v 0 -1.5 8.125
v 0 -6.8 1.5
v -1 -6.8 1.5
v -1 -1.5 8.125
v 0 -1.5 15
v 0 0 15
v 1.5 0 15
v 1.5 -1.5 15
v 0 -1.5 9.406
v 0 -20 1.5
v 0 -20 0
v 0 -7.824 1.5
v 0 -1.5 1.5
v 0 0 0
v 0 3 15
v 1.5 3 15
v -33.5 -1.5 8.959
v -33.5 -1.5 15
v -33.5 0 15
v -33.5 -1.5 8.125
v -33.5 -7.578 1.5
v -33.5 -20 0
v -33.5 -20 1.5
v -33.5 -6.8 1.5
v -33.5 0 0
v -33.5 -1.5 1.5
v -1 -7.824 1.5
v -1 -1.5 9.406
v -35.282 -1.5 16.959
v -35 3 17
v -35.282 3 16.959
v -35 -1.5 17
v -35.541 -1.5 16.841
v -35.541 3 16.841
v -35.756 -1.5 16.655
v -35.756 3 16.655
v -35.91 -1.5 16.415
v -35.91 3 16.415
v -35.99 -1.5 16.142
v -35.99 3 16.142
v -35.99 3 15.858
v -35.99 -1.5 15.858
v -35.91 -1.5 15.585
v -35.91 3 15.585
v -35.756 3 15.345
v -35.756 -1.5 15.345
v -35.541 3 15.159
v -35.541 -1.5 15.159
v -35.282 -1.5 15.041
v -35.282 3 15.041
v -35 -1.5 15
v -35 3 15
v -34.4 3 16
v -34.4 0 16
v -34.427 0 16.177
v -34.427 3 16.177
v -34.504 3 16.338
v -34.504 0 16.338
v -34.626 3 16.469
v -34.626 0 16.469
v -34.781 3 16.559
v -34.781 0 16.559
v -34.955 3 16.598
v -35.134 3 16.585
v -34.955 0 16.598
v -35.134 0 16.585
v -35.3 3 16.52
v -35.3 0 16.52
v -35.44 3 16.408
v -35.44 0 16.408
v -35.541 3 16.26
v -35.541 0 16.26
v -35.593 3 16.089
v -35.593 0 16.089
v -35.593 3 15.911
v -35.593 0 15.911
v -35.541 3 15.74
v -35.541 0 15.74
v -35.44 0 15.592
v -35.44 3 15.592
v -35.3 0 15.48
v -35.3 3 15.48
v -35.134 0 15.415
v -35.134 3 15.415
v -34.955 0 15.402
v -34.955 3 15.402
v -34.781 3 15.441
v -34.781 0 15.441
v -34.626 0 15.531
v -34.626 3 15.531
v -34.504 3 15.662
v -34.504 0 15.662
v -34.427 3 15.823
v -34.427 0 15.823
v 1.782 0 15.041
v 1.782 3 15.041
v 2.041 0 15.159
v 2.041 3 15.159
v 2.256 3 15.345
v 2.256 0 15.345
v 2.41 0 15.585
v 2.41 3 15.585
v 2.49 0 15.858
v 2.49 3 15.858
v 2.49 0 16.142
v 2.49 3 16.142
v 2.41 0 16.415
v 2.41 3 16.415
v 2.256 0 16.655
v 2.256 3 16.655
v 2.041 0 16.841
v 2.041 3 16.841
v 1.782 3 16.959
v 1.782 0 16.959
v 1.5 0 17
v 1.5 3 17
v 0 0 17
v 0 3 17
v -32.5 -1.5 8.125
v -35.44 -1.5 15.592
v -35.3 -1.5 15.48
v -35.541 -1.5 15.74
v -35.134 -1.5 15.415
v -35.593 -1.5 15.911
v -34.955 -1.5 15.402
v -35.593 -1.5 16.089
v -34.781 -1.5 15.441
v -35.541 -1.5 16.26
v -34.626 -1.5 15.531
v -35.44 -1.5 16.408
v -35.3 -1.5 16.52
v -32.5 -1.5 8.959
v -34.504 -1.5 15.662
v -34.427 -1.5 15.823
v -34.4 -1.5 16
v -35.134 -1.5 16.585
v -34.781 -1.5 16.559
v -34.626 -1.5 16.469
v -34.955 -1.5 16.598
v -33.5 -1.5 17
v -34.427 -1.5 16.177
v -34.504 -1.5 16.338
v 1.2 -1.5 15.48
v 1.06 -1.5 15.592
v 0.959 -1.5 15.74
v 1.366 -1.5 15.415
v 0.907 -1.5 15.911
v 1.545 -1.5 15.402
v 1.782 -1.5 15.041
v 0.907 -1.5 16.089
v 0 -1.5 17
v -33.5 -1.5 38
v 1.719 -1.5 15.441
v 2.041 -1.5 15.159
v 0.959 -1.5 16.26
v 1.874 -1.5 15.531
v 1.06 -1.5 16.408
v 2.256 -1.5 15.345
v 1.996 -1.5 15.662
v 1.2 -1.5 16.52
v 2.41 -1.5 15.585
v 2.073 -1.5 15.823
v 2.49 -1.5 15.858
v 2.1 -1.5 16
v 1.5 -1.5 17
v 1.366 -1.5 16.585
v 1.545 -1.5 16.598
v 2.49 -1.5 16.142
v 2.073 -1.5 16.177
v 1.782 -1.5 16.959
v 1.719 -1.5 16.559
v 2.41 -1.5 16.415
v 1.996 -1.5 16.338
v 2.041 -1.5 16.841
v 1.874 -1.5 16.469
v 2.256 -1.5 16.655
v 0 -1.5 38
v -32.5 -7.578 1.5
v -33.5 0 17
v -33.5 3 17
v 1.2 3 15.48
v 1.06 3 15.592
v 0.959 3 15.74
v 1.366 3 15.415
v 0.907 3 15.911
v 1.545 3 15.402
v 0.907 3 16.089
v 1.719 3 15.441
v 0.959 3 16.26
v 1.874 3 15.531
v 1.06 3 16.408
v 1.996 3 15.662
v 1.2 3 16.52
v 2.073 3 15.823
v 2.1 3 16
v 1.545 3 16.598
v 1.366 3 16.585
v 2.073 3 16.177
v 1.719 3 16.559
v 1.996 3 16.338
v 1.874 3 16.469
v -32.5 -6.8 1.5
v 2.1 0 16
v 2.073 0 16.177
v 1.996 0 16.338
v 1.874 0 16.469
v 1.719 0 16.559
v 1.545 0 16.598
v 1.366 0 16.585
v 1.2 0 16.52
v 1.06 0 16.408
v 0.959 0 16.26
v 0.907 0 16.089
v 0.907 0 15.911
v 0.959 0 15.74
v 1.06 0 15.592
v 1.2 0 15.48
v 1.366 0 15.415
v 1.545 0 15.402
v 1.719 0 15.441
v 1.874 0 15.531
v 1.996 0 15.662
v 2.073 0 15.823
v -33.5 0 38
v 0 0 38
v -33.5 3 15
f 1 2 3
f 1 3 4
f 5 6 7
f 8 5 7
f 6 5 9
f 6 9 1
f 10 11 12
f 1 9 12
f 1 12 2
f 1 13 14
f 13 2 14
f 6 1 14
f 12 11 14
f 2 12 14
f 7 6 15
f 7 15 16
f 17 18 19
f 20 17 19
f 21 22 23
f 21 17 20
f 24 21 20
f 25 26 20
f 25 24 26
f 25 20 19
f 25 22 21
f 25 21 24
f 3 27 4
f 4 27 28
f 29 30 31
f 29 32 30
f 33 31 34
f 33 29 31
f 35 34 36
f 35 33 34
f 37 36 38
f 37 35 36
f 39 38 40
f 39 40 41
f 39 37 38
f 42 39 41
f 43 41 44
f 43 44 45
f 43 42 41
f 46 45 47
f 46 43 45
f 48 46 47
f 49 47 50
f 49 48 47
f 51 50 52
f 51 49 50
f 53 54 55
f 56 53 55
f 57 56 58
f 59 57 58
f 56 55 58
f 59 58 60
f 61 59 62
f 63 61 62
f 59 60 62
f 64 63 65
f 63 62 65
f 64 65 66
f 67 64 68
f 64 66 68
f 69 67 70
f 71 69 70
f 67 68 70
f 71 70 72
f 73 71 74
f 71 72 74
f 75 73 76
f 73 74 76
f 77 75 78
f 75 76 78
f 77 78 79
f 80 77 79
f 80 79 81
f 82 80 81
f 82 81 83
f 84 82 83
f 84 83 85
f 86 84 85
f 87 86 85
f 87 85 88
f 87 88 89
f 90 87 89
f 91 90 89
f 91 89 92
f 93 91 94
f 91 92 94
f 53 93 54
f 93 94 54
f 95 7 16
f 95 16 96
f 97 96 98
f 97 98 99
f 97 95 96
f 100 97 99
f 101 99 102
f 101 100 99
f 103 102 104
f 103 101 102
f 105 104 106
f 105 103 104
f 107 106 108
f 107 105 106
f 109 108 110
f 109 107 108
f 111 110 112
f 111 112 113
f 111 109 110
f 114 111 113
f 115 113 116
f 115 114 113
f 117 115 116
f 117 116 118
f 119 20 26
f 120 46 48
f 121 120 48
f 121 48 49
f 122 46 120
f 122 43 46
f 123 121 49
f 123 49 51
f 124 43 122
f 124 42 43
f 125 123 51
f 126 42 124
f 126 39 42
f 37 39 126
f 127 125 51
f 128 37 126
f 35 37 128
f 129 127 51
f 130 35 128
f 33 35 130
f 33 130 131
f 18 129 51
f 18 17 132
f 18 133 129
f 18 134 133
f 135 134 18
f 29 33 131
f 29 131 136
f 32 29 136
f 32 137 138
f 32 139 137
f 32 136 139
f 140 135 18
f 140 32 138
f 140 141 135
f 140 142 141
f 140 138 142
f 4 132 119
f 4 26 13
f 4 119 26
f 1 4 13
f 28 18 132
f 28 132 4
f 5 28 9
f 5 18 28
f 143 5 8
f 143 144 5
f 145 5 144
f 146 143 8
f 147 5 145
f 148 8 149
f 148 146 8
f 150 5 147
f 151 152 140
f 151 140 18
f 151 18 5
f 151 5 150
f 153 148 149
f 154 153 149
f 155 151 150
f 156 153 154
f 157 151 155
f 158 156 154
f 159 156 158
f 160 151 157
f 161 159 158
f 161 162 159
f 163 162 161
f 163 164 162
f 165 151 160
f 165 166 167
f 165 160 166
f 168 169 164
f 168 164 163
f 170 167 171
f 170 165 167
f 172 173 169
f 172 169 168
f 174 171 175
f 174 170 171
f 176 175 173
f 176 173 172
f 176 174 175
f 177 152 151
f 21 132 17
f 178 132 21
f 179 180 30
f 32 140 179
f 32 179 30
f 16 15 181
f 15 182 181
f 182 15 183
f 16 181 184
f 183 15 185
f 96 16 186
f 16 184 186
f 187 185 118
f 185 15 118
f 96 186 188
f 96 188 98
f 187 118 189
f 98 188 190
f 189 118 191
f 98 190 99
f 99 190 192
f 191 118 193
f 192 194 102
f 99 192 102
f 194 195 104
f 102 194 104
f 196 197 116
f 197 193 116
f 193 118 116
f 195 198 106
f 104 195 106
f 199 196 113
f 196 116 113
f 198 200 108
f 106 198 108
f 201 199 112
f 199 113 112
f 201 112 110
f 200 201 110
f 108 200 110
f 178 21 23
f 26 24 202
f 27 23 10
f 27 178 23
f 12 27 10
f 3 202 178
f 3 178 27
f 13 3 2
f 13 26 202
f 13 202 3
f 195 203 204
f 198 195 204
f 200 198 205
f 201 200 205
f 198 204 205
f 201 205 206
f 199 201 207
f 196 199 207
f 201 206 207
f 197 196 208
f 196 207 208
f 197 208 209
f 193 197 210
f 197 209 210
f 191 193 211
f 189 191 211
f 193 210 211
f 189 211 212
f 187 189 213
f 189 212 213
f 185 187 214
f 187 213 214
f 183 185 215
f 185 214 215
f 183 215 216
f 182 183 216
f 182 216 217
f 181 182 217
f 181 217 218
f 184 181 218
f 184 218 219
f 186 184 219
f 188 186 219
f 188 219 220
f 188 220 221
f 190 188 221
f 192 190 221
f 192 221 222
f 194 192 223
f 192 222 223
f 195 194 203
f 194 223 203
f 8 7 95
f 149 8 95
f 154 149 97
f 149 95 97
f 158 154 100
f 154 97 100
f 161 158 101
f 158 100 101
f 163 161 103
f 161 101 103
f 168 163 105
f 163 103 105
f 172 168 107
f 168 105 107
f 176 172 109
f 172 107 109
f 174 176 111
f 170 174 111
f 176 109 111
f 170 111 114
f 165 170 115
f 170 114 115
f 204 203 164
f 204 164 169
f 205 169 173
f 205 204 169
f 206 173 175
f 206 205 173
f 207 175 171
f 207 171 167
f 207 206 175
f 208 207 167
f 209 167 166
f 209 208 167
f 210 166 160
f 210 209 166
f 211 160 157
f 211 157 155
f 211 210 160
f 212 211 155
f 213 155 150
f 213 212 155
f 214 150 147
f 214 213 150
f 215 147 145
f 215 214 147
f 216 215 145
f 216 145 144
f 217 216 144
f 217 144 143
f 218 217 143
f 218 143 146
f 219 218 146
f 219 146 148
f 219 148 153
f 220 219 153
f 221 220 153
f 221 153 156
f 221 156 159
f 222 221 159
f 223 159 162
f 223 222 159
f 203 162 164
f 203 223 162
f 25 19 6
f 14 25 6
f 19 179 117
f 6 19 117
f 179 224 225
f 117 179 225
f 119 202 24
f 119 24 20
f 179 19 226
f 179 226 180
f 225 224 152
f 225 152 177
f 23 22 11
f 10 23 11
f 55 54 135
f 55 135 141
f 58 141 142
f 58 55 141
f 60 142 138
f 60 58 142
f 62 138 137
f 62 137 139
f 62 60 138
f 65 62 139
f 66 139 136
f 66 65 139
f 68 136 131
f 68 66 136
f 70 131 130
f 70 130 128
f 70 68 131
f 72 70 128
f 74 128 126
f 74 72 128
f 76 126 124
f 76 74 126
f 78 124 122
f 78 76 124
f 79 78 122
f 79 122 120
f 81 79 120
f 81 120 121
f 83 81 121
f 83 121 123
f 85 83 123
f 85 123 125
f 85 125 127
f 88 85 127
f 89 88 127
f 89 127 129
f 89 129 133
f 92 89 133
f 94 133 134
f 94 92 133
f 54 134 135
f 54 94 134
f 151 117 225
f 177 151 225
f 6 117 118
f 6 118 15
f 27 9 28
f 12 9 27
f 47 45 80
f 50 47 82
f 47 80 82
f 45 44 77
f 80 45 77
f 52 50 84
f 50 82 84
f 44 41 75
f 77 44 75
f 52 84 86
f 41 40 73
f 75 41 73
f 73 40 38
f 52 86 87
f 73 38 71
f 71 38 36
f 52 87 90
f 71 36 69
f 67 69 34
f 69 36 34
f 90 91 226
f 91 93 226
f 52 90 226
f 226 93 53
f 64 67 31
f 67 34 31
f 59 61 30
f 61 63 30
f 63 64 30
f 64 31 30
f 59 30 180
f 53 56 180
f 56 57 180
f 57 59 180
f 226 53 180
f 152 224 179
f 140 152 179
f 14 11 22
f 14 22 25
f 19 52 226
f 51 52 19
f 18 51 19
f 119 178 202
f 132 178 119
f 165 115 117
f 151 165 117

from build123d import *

# Parameters (mm, degrees)
F0_W     = 33.5
F0_H     = 21
F0_H_2   = 2
F0_H_3   = 15
F0_R     = 0.6
F3_DEPTH = 1.5
F1_W     = 33.5
F1_H     = 20
F4_DEPTH = 1.5
F5_DEPTH = 1
F8_DEPTH = 1
F9_DEPTH = 3


with BuildPart() as f3:
    # F0 (on Front) → F3 (new body)
    with BuildSketch(Plane.XZ):
        with Locations((-16.75, 27.5)):
            Rectangle(F0_W, F0_H)
        with Locations((-16.75, 16)):
            Rectangle(F0_W, F0_H_2)
        with Locations((-16.75, 7.5)):
            Rectangle(F0_W, F0_H_3)
        with BuildLine():
            Line((-35, 15), (-33.5, 15))
            Line((-33.5, 15), (-33.5, 17))
            Line((-33.5, 17), (-35, 17))
            ThreePointArc((-35, 17), (-36, 16), (-35, 15))
        make_face()
        with Locations((-35, 16)):
            Circle(F0_R, mode=Mode.SUBTRACT)
        with BuildLine():
            Line((0, 17), (0, 15))
            Line((0, 15), (1.5, 15))
            ThreePointArc((1.5, 15), (2.5, 16), (1.5, 17))
            Line((1.5, 17), (0, 17))
        make_face()
        with Locations((1.5, 16)):
            Circle(F0_R, mode=Mode.SUBTRACT)
    extrude(amount=F3_DEPTH)

    # F1 (on Top) → F4 (join)
    with BuildSketch(Plane.XY):
        with Locations((-16.75, -10)):
            Rectangle(F1_W, F1_H)
    extrude(amount=F4_DEPTH)

    # F2 (on Right) → F5 (join)
    with BuildSketch(Plane.YZ):
        Polygon((-9.024499878, 0), (-8, 0), (0, 10), (0, 11.2806248475), align=None)
    extrude(amount=-F5_DEPTH)

    # F7 (on offset) → F8 (join)
    with BuildSketch(Plane.YZ.offset(-32.5)):
        Polygon((-8.8, 0), (-8, 0), (0, 10), (0, 10.8), align=None)
    extrude(amount=-F8_DEPTH)

    # F0 (on Front) → F9 (join)
    with BuildSketch(Plane.XZ):
        with BuildLine():
            Line((-35, 15), (-33.5, 15))
            Line((-33.5, 15), (-33.5, 17))
            Line((-33.5, 17), (-35, 17))
            ThreePointArc((-35, 17), (-36, 16), (-35, 15))
        make_face()
        with Locations((-35, 16)):
            Circle(F0_R, mode=Mode.SUBTRACT)
        with BuildLine():
            Line((0, 17), (0, 15))
            Line((0, 15), (1.5, 15))
            ThreePointArc((1.5, 15), (2.5, 16), (1.5, 17))
            Line((1.5, 17), (0, 17))
        make_face()
        with Locations((1.5, 16)):
            Circle(F0_R, mode=Mode.SUBTRACT)
    extrude(amount=-F9_DEPTH)


solid = f3.part
